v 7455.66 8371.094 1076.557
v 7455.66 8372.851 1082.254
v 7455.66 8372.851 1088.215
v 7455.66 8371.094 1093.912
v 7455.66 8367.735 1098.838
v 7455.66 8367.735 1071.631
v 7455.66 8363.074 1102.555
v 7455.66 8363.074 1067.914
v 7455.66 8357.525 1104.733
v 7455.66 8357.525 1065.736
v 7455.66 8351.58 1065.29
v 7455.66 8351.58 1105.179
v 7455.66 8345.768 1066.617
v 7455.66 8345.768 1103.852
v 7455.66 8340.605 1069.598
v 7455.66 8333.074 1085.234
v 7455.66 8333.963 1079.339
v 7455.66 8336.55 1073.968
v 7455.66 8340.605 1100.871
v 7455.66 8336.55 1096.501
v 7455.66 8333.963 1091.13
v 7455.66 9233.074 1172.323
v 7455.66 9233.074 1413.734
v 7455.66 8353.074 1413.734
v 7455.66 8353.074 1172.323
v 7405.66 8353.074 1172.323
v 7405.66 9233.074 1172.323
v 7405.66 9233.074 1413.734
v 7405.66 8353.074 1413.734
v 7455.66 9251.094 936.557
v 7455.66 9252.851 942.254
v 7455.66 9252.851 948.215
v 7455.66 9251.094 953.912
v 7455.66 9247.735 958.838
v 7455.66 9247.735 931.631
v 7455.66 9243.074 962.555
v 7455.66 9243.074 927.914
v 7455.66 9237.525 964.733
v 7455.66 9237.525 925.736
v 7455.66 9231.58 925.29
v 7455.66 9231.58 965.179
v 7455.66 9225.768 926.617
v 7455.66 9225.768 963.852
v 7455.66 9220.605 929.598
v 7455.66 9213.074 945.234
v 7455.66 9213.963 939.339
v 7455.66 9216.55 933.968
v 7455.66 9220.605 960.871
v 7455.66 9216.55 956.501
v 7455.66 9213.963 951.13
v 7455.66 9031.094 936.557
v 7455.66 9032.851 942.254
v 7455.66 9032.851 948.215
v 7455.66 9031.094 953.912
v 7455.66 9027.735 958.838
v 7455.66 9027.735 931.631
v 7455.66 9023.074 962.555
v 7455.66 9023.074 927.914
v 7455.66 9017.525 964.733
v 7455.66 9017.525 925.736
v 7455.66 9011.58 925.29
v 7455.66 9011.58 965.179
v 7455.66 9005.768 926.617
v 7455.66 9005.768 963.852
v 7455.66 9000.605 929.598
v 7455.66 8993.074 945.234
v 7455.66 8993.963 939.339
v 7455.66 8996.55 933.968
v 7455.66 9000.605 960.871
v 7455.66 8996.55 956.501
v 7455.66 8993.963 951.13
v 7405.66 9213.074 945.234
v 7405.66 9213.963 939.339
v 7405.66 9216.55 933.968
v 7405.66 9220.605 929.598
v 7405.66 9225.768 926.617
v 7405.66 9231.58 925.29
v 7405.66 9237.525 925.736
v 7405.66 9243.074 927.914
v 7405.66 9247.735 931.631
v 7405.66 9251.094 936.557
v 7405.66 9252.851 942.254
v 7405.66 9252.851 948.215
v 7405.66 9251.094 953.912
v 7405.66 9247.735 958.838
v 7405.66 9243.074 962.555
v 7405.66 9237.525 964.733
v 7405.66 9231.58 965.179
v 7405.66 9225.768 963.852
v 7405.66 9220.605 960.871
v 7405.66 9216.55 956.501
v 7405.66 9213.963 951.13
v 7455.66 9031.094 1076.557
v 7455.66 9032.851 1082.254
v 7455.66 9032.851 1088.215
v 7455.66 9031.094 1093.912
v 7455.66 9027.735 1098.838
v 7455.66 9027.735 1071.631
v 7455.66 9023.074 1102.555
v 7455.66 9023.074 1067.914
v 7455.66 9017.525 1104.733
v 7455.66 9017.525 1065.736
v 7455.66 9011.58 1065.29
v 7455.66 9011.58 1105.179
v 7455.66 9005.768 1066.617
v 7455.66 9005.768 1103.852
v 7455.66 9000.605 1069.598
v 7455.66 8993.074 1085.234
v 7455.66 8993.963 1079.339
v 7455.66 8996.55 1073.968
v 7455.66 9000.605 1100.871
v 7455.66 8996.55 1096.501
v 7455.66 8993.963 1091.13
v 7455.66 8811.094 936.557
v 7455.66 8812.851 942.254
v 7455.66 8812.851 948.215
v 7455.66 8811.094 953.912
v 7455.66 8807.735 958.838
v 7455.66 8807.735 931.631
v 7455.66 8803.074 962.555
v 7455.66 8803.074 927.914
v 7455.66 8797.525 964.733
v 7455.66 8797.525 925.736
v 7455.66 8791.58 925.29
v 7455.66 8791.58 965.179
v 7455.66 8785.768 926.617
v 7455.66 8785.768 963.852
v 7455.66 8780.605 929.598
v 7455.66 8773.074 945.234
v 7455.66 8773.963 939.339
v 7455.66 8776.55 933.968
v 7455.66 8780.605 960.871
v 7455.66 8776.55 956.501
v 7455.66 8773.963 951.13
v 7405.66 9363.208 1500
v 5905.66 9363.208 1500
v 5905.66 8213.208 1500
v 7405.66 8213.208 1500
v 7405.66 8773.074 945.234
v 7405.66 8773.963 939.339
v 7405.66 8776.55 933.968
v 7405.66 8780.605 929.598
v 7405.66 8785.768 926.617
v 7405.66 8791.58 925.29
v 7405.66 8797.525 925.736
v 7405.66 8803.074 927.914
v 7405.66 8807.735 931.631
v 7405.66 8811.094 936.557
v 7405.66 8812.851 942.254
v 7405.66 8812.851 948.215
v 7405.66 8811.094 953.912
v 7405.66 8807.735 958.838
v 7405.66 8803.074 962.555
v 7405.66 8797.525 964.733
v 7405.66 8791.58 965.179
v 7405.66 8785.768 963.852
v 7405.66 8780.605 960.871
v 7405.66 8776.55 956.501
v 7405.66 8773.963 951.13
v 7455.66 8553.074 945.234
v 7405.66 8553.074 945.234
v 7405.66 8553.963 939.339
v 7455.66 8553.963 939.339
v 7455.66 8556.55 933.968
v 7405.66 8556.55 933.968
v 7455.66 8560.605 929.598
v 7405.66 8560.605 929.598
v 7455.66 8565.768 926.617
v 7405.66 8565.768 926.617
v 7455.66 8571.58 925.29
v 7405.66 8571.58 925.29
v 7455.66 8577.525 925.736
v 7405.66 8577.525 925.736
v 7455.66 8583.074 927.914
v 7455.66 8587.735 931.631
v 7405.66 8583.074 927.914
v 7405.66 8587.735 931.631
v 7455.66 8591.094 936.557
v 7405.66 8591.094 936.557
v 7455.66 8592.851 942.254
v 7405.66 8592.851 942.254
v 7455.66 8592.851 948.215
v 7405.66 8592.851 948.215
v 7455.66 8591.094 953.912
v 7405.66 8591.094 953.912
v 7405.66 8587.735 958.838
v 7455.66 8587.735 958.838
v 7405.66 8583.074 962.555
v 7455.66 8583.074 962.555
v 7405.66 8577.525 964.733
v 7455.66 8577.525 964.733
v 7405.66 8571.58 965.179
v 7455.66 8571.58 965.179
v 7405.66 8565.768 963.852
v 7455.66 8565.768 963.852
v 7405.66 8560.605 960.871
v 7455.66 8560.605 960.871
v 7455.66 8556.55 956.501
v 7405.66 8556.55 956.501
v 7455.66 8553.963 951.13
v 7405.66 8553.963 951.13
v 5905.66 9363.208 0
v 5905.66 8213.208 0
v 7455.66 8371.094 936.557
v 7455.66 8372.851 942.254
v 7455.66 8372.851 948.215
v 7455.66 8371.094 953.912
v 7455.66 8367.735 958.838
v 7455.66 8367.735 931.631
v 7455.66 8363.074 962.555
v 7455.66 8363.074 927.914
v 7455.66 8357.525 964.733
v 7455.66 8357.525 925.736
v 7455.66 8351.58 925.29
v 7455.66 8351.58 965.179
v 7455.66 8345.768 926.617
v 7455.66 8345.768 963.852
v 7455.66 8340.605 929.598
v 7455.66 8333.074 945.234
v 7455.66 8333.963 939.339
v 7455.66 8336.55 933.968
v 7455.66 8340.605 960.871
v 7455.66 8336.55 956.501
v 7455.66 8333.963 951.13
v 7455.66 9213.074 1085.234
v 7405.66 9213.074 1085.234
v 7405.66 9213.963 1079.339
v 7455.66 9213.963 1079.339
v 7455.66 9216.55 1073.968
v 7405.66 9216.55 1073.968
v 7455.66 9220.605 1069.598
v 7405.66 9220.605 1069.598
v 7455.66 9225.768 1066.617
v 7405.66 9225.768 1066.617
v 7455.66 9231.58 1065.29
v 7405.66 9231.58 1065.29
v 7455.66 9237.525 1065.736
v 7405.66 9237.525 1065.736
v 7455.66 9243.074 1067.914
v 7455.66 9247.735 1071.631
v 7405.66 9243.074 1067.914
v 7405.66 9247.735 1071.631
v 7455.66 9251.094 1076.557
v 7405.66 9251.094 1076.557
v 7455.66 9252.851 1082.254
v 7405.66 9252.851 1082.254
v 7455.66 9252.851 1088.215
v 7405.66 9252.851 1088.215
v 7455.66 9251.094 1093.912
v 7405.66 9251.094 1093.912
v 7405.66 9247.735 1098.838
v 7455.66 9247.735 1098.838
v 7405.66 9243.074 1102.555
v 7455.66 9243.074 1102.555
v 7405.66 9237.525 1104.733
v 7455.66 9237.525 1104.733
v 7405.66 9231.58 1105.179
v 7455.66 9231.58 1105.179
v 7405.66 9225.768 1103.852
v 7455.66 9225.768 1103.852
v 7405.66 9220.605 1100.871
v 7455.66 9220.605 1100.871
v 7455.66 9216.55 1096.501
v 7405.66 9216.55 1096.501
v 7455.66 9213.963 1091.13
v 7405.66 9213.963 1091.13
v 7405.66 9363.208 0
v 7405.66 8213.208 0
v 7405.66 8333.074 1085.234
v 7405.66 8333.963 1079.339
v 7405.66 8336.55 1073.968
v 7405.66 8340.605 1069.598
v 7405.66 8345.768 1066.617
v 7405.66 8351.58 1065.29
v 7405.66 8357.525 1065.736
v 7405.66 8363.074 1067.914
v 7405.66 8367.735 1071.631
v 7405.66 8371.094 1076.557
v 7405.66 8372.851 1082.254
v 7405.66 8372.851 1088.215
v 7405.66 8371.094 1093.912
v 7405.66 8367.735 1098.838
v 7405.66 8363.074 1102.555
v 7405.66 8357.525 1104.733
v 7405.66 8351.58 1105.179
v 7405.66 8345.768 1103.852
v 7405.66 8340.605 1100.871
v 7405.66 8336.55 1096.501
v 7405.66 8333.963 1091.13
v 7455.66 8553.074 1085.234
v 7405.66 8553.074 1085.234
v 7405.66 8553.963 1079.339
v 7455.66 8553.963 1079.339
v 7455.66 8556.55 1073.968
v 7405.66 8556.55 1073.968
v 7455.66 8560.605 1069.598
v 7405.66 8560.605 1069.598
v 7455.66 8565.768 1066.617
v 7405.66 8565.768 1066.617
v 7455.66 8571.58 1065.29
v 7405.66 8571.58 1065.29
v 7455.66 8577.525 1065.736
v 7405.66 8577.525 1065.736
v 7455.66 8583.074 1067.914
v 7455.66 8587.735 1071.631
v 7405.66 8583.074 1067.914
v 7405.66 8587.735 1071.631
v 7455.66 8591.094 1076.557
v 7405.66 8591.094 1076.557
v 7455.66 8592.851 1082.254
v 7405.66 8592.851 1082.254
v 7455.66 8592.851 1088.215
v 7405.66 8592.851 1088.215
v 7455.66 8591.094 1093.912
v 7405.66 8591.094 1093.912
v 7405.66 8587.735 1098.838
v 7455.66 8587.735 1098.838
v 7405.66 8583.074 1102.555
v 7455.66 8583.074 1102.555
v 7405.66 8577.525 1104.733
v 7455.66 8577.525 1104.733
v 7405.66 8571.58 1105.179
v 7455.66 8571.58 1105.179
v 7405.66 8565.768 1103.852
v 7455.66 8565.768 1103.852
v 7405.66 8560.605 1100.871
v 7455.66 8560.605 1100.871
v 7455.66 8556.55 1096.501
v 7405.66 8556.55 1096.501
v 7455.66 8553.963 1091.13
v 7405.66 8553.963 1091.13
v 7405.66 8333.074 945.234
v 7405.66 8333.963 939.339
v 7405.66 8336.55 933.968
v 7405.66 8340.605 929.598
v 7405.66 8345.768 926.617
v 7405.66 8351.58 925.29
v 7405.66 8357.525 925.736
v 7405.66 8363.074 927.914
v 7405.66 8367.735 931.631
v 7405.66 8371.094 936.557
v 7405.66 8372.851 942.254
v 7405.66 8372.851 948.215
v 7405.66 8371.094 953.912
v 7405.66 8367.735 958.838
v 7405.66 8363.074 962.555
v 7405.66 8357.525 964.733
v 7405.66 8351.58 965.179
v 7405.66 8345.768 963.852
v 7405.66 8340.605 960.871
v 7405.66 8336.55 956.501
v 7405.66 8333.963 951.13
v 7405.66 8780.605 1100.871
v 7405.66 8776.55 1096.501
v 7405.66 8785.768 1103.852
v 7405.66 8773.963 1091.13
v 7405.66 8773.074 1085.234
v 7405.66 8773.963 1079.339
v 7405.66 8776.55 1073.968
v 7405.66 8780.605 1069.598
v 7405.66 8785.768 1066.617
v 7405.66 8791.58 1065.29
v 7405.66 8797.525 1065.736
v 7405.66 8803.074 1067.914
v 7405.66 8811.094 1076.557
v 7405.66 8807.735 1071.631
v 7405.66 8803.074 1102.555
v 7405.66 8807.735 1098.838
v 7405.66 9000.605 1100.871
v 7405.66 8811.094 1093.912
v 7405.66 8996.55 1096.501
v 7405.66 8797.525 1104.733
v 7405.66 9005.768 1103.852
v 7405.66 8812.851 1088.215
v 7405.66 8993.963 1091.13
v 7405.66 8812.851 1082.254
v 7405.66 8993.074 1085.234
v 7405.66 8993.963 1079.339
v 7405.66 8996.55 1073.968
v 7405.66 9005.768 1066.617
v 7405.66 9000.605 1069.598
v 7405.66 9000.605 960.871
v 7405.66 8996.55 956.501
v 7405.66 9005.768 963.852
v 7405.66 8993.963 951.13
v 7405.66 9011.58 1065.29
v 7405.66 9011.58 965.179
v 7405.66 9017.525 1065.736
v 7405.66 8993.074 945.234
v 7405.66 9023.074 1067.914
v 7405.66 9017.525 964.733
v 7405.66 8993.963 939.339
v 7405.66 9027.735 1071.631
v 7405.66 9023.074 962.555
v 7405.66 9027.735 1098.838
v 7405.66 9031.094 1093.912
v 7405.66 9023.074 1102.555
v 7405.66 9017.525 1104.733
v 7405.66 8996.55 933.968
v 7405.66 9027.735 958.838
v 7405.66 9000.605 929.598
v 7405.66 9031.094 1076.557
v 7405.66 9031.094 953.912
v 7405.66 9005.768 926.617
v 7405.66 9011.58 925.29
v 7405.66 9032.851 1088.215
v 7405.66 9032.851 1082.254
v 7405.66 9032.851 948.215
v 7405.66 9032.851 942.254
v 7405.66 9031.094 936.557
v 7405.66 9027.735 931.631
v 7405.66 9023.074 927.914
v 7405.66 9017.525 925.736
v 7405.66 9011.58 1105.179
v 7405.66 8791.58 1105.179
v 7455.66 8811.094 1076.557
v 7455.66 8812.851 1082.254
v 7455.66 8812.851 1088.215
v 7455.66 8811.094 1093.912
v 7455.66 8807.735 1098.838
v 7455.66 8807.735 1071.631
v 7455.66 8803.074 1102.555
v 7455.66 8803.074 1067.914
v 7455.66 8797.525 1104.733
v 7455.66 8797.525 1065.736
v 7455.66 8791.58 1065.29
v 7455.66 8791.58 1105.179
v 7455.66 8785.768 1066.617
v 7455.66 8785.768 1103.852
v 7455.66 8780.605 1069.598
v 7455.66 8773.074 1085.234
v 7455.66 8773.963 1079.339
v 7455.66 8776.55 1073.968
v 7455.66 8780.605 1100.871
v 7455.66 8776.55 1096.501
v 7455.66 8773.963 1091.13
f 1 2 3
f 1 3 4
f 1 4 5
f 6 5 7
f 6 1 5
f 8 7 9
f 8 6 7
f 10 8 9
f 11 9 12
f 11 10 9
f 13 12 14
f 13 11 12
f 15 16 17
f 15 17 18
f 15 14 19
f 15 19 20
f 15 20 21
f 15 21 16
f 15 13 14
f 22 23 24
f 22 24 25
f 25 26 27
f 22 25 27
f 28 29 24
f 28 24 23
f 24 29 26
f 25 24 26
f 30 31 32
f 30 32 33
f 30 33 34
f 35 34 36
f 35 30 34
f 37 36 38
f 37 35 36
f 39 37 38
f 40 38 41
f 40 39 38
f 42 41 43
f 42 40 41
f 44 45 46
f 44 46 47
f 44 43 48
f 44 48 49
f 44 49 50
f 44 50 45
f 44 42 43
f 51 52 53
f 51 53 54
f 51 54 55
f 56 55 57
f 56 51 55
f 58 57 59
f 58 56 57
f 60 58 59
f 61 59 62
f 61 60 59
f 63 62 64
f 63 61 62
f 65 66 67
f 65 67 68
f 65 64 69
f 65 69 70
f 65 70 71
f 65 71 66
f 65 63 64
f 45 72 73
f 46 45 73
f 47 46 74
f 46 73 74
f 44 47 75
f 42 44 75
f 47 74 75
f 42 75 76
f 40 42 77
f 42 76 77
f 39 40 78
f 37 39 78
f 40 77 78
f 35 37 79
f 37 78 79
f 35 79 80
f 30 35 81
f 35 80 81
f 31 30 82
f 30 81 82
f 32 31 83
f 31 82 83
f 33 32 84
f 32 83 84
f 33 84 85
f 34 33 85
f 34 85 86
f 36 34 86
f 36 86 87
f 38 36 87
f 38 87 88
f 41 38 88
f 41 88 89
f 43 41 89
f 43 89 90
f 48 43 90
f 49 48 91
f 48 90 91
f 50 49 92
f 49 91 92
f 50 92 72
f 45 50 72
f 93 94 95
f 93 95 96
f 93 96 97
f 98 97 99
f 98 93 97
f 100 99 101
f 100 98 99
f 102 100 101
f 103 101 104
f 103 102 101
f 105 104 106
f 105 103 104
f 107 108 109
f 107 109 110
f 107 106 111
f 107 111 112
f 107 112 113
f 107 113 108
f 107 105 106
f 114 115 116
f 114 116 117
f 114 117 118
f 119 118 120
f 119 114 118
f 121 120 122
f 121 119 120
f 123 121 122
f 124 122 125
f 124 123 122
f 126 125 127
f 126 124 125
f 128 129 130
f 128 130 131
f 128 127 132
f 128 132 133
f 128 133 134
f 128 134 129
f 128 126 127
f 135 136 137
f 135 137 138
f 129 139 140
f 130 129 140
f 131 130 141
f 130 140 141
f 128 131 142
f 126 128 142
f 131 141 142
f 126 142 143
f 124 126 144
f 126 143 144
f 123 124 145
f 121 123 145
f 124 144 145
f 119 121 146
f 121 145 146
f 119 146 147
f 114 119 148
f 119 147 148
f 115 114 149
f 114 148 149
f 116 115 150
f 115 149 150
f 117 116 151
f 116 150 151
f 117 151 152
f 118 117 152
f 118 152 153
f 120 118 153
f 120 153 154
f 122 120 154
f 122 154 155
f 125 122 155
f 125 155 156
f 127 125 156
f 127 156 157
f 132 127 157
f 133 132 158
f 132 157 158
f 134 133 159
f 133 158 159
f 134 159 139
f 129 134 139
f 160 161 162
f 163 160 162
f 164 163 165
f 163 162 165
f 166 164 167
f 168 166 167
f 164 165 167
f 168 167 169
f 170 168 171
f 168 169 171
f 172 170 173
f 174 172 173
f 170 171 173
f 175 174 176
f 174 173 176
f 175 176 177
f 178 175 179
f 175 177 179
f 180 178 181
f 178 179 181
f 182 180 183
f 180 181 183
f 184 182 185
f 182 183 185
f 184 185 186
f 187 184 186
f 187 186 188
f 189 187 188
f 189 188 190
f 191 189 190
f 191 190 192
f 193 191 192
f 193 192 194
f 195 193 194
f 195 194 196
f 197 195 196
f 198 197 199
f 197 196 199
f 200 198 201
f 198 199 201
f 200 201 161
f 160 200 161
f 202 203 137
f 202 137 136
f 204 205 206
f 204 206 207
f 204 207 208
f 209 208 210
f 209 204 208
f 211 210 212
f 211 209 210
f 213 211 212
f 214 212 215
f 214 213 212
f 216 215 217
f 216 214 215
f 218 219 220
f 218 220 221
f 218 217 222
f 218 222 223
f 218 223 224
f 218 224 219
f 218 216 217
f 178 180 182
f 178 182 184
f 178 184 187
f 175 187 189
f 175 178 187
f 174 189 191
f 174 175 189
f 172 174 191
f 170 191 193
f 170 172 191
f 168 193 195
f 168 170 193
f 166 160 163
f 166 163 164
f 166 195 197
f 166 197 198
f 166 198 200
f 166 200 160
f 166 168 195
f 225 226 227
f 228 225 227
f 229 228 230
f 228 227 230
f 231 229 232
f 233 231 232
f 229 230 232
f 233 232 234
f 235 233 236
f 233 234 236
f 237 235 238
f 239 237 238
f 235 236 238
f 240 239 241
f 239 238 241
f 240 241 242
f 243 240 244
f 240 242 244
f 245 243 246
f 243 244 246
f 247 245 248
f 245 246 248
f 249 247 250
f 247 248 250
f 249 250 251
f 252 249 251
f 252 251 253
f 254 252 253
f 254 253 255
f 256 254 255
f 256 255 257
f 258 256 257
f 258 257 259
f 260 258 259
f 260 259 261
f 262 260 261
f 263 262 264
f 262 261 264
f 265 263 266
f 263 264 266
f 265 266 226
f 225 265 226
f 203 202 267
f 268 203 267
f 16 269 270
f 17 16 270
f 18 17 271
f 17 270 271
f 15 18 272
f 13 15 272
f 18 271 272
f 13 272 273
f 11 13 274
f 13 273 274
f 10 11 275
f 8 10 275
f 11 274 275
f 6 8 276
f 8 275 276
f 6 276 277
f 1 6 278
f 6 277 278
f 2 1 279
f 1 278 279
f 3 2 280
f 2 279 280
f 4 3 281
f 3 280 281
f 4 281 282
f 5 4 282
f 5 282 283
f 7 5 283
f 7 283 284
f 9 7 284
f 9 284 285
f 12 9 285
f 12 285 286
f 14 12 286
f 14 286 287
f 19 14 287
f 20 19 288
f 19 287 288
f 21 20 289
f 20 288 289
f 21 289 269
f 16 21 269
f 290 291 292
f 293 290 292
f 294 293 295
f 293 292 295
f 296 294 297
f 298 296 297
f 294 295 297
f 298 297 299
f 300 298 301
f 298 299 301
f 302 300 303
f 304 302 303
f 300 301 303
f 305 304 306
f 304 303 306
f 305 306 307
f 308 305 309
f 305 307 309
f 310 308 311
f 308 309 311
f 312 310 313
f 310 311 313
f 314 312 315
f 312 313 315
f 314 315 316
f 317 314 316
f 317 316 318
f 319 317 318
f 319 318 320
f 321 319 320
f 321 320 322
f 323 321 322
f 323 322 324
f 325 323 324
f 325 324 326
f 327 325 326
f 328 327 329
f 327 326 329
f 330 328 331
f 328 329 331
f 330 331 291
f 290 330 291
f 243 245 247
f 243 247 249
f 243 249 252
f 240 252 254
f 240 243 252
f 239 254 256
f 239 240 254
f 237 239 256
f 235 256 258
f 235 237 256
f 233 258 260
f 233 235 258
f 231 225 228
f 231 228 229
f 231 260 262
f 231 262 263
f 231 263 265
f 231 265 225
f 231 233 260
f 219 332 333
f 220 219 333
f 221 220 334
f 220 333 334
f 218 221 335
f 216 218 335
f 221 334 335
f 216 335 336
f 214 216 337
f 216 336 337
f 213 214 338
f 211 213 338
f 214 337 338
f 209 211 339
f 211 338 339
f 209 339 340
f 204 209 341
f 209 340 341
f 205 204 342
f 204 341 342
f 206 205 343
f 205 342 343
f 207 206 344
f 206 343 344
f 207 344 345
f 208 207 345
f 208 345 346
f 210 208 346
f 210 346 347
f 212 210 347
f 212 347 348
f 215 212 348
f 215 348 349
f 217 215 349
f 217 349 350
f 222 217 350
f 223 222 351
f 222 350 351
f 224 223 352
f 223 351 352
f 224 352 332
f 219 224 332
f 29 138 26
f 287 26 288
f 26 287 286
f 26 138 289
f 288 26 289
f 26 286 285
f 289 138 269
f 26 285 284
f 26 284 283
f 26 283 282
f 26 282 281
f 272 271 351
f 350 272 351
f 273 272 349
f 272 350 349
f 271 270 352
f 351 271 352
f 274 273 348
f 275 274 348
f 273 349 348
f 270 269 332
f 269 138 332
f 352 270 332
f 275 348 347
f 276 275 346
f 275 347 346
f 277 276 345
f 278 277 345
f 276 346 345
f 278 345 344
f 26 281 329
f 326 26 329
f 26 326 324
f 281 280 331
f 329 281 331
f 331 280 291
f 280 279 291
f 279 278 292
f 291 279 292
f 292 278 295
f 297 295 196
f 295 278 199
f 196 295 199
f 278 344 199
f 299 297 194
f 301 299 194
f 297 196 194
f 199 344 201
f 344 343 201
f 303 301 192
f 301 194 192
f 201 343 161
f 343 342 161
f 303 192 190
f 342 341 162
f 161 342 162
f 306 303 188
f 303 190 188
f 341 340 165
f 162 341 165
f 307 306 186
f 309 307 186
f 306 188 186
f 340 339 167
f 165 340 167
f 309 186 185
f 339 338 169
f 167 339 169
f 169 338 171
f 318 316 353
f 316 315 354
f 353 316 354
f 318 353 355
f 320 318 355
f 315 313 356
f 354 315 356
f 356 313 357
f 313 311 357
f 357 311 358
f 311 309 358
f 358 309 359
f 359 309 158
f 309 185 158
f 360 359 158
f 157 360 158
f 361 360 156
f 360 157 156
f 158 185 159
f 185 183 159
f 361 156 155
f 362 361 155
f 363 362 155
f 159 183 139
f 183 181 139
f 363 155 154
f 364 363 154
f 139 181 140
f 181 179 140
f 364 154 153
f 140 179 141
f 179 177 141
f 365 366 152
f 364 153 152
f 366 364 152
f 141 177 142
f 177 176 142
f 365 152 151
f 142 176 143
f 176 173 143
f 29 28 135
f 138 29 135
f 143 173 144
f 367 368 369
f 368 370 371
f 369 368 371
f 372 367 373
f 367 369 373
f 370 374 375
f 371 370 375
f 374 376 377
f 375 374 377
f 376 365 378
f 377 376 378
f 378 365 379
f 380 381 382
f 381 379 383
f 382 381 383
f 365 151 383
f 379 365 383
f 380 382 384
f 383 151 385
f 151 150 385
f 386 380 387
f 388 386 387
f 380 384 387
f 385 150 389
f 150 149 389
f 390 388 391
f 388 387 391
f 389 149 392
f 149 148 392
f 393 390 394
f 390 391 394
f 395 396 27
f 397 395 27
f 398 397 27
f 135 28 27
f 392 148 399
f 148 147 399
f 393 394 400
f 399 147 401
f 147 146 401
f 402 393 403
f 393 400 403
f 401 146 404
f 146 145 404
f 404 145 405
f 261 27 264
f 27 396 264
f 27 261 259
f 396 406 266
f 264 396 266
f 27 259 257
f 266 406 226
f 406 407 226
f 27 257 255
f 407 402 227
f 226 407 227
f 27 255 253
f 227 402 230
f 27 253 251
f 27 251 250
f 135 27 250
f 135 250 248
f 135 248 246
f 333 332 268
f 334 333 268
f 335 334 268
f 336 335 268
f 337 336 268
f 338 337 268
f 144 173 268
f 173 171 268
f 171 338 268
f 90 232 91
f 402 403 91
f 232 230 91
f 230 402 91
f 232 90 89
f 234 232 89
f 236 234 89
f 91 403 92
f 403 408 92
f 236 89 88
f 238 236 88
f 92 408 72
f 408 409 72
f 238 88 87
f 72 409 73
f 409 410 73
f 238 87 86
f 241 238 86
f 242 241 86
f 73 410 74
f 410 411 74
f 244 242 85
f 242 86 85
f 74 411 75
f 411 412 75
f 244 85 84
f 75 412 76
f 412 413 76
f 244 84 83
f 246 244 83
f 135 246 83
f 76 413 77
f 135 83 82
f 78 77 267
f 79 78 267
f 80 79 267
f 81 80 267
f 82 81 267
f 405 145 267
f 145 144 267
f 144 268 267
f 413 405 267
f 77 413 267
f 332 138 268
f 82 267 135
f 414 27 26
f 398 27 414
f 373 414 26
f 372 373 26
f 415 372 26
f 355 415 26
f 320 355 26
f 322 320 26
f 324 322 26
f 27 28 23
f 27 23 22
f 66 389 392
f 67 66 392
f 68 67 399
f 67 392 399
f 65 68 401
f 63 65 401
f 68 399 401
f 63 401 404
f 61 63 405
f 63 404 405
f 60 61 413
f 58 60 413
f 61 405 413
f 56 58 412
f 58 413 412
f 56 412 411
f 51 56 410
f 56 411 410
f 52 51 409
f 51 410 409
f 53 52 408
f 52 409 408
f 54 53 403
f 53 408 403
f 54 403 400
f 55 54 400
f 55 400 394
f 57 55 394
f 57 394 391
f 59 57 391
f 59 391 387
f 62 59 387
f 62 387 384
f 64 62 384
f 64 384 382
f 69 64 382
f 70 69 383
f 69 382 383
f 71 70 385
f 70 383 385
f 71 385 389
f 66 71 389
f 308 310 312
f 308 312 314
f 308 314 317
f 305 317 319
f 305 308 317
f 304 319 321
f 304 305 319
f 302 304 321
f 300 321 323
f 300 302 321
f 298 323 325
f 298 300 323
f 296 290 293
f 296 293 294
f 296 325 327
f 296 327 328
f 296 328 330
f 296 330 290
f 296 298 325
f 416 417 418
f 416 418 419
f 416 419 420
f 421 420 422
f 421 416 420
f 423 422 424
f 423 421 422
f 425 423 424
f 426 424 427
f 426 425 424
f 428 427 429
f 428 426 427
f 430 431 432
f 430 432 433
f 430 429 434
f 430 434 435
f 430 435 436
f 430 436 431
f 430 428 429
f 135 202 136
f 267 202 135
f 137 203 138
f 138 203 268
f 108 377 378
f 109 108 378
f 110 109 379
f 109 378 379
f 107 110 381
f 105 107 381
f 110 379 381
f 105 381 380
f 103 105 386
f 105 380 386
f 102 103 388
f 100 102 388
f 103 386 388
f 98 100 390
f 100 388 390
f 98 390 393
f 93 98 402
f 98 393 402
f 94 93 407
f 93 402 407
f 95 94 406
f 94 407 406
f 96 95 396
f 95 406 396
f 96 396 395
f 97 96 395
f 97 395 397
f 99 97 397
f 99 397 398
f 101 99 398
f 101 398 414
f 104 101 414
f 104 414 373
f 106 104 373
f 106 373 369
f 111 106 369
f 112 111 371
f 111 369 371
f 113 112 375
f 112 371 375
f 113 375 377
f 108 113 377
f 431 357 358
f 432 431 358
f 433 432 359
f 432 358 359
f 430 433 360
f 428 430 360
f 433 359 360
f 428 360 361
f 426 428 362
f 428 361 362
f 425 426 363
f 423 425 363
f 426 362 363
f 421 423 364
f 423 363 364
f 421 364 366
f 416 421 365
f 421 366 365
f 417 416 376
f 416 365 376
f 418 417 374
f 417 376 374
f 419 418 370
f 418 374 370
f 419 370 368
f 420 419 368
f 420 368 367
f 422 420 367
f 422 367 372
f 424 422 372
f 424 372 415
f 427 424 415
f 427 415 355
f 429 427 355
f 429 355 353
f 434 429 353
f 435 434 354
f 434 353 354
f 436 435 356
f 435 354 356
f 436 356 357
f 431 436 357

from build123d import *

# Parameters (mm, degrees)
SKETCH1_W           = 1500
SKETCH1_H           = 1150
BOSS_EXTRUDE1_DEPTH = 1500
SKETCH2_R           = 20
SKETCH2_W           = 241.410698637
SKETCH2_H           = 880
BOSS_EXTRUDE2_DEPTH = 50


with BuildPart() as part:
    # Sketch1 → Boss-Extrude1 (new body)
    with BuildSketch(Plane.XY):
        with Locations((6655.660377358, 8788.20754717)):
            Rectangle(SKETCH1_W, SKETCH1_H)
    extrude(amount=BOSS_EXTRUDE1_DEPTH)

    # Sketch2 → Boss-Extrude2 (add)
    with BuildSketch(Plane(origin=(7405.660377359, 0, 0), x_dir=(0, 0, -1), z_dir=(1, 0, 0))):
        with Locations(Location((-1085.234472632, 8353.074404115, 0), (0, 0, 270))):
            Circle(SKETCH2_R)
        with Locations(Location((-945.234472632, 8353.074404115, 0), (0, 0, 270))):
            Circle(SKETCH2_R)
        with Locations(Location((-945.234472632, 8573.074404115, 0), (0, 0, 270))):
            Circle(SKETCH2_R)
        with Locations(Location((-945.234472632, 8793.074404115, 0), (0, 0, 270))):
            Circle(SKETCH2_R)
        with Locations(Location((-945.234472632, 9013.074404115, 0), (0, 0, 270))):
            Circle(SKETCH2_R)
        with Locations(Location((-945.234472632, 9233.074404115, 0), (0, 0, 270))):
            Circle(SKETCH2_R)
        with Locations(Location((-1085.234472632, 8573.074404115, 0), (0, 0, 270))):
            Circle(SKETCH2_R)
        with Locations(Location((-1085.234472632, 8793.074404115, 0), (0, 0, 270))):
            Circle(SKETCH2_R)
        with Locations(Location((-1085.234472632, 9013.074404115, 0), (0, 0, 270))):
            Circle(SKETCH2_R)
        with Locations(Location((-1085.234472632, 9233.074404115, 0), (0, 0, 270))):
            Circle(SKETCH2_R)
        with Locations((-1293.028757662, 8793.074404115)):
            Rectangle(SKETCH2_W, SKETCH2_H)
    extrude(amount=BOSS_EXTRUDE2_DEPTH)


solid = part.part
